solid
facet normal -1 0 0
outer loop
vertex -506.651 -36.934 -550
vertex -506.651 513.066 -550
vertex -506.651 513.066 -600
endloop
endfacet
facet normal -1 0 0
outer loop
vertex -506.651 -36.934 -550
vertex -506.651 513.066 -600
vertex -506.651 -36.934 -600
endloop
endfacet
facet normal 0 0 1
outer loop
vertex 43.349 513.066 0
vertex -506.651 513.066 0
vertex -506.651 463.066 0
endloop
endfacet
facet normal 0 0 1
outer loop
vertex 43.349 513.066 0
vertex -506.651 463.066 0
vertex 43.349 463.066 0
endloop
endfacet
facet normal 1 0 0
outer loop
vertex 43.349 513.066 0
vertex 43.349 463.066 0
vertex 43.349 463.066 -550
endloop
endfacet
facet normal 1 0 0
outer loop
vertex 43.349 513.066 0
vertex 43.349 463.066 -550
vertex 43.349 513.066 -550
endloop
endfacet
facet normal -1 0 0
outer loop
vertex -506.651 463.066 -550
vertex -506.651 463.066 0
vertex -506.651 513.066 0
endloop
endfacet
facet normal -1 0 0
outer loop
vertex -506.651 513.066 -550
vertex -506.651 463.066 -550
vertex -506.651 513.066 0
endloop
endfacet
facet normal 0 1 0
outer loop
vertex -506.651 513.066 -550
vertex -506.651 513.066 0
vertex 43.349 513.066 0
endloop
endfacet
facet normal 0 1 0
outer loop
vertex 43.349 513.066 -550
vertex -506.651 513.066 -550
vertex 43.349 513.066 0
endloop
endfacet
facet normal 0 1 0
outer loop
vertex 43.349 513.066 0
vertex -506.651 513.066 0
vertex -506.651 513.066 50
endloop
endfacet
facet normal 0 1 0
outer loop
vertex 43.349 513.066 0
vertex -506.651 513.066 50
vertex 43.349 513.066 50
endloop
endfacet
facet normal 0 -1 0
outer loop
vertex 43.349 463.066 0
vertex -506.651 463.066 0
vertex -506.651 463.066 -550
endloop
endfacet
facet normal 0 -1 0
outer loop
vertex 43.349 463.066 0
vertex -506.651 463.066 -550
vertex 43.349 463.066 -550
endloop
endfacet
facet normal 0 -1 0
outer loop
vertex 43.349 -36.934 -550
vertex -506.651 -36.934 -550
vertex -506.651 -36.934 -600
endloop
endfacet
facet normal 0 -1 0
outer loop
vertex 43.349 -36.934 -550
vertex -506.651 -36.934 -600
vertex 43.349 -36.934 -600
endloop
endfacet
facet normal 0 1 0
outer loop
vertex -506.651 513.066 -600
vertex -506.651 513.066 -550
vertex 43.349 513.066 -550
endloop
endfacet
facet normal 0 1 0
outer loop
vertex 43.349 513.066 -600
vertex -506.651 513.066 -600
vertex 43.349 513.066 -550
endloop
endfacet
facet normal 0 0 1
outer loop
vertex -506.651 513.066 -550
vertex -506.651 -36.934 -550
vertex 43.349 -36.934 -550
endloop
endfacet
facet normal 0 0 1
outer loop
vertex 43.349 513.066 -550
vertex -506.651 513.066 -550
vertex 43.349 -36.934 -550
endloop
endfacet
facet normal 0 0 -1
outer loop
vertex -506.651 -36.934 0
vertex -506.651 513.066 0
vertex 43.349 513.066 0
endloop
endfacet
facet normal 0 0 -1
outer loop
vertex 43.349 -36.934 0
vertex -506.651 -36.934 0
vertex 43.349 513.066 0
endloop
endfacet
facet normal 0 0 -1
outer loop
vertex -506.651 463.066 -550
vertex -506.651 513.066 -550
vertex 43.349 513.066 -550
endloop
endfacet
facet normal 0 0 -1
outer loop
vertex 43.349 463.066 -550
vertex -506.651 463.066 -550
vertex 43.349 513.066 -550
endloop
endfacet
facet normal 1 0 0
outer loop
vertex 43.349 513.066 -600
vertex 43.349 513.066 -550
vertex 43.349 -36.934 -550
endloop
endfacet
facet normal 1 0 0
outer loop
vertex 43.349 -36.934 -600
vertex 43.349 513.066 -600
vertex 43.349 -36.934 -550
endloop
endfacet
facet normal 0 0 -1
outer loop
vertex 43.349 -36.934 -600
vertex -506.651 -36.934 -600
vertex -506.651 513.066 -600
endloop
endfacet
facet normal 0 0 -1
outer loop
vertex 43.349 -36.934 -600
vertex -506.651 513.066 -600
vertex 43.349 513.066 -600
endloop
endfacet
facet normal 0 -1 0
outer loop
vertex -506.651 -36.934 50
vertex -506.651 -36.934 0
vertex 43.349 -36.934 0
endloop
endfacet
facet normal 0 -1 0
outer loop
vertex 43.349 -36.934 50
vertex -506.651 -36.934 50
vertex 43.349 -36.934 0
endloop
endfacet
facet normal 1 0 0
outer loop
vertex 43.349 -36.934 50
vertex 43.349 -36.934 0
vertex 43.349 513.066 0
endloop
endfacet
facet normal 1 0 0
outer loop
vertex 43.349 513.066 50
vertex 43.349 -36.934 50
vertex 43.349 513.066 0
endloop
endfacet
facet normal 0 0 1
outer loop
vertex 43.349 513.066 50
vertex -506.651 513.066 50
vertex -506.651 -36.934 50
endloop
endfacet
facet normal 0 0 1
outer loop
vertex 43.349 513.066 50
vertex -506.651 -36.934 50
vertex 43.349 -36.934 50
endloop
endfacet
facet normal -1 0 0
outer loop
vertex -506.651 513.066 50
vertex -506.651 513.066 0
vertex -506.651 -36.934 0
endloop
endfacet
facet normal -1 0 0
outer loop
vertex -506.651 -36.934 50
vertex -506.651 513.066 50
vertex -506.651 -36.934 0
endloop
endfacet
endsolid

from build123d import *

# Parameters (mm, degrees)
F0_W     = 550
F0_H     = 50
F0_H_2   = 500
F1_DEPTH = 50
F2_DEPTH = 550
F3_W     = 550
F3_H     = 550
F4_DEPTH = 50


with BuildPart() as f1:
    # F0 (on Top) → F1 (new body)
    with BuildSketch(Plane.XY):
        with Locations((-231.651401, 488.065613)):
            Rectangle(F0_W, F0_H)
        with Locations((-231.651401, 213.065613)):
            Rectangle(F0_W, F0_H_2)
    extrude(amount=F1_DEPTH)


with BuildPart() as f2:
    # F0 (on Top) → F2 (new body)
    with BuildSketch(Plane.XY):
        with Locations((-231.651401, 488.065613)):
            Rectangle(F0_W, F0_H)
    extrude(amount=-F2_DEPTH)


with BuildPart() as f4:
    # F3 (on face) → F4 (new body)
    with BuildSketch(Plane(origin=(0, 0, -550), x_dir=(1, 0, 0), z_dir=(0, 0, -1))):
        with Locations((-231.651401, -238.065613)):
            Rectangle(F3_W, F3_H)
    extrude(amount=F4_DEPTH)


solid = Compound([f1.part, f2.part, f4.part])
